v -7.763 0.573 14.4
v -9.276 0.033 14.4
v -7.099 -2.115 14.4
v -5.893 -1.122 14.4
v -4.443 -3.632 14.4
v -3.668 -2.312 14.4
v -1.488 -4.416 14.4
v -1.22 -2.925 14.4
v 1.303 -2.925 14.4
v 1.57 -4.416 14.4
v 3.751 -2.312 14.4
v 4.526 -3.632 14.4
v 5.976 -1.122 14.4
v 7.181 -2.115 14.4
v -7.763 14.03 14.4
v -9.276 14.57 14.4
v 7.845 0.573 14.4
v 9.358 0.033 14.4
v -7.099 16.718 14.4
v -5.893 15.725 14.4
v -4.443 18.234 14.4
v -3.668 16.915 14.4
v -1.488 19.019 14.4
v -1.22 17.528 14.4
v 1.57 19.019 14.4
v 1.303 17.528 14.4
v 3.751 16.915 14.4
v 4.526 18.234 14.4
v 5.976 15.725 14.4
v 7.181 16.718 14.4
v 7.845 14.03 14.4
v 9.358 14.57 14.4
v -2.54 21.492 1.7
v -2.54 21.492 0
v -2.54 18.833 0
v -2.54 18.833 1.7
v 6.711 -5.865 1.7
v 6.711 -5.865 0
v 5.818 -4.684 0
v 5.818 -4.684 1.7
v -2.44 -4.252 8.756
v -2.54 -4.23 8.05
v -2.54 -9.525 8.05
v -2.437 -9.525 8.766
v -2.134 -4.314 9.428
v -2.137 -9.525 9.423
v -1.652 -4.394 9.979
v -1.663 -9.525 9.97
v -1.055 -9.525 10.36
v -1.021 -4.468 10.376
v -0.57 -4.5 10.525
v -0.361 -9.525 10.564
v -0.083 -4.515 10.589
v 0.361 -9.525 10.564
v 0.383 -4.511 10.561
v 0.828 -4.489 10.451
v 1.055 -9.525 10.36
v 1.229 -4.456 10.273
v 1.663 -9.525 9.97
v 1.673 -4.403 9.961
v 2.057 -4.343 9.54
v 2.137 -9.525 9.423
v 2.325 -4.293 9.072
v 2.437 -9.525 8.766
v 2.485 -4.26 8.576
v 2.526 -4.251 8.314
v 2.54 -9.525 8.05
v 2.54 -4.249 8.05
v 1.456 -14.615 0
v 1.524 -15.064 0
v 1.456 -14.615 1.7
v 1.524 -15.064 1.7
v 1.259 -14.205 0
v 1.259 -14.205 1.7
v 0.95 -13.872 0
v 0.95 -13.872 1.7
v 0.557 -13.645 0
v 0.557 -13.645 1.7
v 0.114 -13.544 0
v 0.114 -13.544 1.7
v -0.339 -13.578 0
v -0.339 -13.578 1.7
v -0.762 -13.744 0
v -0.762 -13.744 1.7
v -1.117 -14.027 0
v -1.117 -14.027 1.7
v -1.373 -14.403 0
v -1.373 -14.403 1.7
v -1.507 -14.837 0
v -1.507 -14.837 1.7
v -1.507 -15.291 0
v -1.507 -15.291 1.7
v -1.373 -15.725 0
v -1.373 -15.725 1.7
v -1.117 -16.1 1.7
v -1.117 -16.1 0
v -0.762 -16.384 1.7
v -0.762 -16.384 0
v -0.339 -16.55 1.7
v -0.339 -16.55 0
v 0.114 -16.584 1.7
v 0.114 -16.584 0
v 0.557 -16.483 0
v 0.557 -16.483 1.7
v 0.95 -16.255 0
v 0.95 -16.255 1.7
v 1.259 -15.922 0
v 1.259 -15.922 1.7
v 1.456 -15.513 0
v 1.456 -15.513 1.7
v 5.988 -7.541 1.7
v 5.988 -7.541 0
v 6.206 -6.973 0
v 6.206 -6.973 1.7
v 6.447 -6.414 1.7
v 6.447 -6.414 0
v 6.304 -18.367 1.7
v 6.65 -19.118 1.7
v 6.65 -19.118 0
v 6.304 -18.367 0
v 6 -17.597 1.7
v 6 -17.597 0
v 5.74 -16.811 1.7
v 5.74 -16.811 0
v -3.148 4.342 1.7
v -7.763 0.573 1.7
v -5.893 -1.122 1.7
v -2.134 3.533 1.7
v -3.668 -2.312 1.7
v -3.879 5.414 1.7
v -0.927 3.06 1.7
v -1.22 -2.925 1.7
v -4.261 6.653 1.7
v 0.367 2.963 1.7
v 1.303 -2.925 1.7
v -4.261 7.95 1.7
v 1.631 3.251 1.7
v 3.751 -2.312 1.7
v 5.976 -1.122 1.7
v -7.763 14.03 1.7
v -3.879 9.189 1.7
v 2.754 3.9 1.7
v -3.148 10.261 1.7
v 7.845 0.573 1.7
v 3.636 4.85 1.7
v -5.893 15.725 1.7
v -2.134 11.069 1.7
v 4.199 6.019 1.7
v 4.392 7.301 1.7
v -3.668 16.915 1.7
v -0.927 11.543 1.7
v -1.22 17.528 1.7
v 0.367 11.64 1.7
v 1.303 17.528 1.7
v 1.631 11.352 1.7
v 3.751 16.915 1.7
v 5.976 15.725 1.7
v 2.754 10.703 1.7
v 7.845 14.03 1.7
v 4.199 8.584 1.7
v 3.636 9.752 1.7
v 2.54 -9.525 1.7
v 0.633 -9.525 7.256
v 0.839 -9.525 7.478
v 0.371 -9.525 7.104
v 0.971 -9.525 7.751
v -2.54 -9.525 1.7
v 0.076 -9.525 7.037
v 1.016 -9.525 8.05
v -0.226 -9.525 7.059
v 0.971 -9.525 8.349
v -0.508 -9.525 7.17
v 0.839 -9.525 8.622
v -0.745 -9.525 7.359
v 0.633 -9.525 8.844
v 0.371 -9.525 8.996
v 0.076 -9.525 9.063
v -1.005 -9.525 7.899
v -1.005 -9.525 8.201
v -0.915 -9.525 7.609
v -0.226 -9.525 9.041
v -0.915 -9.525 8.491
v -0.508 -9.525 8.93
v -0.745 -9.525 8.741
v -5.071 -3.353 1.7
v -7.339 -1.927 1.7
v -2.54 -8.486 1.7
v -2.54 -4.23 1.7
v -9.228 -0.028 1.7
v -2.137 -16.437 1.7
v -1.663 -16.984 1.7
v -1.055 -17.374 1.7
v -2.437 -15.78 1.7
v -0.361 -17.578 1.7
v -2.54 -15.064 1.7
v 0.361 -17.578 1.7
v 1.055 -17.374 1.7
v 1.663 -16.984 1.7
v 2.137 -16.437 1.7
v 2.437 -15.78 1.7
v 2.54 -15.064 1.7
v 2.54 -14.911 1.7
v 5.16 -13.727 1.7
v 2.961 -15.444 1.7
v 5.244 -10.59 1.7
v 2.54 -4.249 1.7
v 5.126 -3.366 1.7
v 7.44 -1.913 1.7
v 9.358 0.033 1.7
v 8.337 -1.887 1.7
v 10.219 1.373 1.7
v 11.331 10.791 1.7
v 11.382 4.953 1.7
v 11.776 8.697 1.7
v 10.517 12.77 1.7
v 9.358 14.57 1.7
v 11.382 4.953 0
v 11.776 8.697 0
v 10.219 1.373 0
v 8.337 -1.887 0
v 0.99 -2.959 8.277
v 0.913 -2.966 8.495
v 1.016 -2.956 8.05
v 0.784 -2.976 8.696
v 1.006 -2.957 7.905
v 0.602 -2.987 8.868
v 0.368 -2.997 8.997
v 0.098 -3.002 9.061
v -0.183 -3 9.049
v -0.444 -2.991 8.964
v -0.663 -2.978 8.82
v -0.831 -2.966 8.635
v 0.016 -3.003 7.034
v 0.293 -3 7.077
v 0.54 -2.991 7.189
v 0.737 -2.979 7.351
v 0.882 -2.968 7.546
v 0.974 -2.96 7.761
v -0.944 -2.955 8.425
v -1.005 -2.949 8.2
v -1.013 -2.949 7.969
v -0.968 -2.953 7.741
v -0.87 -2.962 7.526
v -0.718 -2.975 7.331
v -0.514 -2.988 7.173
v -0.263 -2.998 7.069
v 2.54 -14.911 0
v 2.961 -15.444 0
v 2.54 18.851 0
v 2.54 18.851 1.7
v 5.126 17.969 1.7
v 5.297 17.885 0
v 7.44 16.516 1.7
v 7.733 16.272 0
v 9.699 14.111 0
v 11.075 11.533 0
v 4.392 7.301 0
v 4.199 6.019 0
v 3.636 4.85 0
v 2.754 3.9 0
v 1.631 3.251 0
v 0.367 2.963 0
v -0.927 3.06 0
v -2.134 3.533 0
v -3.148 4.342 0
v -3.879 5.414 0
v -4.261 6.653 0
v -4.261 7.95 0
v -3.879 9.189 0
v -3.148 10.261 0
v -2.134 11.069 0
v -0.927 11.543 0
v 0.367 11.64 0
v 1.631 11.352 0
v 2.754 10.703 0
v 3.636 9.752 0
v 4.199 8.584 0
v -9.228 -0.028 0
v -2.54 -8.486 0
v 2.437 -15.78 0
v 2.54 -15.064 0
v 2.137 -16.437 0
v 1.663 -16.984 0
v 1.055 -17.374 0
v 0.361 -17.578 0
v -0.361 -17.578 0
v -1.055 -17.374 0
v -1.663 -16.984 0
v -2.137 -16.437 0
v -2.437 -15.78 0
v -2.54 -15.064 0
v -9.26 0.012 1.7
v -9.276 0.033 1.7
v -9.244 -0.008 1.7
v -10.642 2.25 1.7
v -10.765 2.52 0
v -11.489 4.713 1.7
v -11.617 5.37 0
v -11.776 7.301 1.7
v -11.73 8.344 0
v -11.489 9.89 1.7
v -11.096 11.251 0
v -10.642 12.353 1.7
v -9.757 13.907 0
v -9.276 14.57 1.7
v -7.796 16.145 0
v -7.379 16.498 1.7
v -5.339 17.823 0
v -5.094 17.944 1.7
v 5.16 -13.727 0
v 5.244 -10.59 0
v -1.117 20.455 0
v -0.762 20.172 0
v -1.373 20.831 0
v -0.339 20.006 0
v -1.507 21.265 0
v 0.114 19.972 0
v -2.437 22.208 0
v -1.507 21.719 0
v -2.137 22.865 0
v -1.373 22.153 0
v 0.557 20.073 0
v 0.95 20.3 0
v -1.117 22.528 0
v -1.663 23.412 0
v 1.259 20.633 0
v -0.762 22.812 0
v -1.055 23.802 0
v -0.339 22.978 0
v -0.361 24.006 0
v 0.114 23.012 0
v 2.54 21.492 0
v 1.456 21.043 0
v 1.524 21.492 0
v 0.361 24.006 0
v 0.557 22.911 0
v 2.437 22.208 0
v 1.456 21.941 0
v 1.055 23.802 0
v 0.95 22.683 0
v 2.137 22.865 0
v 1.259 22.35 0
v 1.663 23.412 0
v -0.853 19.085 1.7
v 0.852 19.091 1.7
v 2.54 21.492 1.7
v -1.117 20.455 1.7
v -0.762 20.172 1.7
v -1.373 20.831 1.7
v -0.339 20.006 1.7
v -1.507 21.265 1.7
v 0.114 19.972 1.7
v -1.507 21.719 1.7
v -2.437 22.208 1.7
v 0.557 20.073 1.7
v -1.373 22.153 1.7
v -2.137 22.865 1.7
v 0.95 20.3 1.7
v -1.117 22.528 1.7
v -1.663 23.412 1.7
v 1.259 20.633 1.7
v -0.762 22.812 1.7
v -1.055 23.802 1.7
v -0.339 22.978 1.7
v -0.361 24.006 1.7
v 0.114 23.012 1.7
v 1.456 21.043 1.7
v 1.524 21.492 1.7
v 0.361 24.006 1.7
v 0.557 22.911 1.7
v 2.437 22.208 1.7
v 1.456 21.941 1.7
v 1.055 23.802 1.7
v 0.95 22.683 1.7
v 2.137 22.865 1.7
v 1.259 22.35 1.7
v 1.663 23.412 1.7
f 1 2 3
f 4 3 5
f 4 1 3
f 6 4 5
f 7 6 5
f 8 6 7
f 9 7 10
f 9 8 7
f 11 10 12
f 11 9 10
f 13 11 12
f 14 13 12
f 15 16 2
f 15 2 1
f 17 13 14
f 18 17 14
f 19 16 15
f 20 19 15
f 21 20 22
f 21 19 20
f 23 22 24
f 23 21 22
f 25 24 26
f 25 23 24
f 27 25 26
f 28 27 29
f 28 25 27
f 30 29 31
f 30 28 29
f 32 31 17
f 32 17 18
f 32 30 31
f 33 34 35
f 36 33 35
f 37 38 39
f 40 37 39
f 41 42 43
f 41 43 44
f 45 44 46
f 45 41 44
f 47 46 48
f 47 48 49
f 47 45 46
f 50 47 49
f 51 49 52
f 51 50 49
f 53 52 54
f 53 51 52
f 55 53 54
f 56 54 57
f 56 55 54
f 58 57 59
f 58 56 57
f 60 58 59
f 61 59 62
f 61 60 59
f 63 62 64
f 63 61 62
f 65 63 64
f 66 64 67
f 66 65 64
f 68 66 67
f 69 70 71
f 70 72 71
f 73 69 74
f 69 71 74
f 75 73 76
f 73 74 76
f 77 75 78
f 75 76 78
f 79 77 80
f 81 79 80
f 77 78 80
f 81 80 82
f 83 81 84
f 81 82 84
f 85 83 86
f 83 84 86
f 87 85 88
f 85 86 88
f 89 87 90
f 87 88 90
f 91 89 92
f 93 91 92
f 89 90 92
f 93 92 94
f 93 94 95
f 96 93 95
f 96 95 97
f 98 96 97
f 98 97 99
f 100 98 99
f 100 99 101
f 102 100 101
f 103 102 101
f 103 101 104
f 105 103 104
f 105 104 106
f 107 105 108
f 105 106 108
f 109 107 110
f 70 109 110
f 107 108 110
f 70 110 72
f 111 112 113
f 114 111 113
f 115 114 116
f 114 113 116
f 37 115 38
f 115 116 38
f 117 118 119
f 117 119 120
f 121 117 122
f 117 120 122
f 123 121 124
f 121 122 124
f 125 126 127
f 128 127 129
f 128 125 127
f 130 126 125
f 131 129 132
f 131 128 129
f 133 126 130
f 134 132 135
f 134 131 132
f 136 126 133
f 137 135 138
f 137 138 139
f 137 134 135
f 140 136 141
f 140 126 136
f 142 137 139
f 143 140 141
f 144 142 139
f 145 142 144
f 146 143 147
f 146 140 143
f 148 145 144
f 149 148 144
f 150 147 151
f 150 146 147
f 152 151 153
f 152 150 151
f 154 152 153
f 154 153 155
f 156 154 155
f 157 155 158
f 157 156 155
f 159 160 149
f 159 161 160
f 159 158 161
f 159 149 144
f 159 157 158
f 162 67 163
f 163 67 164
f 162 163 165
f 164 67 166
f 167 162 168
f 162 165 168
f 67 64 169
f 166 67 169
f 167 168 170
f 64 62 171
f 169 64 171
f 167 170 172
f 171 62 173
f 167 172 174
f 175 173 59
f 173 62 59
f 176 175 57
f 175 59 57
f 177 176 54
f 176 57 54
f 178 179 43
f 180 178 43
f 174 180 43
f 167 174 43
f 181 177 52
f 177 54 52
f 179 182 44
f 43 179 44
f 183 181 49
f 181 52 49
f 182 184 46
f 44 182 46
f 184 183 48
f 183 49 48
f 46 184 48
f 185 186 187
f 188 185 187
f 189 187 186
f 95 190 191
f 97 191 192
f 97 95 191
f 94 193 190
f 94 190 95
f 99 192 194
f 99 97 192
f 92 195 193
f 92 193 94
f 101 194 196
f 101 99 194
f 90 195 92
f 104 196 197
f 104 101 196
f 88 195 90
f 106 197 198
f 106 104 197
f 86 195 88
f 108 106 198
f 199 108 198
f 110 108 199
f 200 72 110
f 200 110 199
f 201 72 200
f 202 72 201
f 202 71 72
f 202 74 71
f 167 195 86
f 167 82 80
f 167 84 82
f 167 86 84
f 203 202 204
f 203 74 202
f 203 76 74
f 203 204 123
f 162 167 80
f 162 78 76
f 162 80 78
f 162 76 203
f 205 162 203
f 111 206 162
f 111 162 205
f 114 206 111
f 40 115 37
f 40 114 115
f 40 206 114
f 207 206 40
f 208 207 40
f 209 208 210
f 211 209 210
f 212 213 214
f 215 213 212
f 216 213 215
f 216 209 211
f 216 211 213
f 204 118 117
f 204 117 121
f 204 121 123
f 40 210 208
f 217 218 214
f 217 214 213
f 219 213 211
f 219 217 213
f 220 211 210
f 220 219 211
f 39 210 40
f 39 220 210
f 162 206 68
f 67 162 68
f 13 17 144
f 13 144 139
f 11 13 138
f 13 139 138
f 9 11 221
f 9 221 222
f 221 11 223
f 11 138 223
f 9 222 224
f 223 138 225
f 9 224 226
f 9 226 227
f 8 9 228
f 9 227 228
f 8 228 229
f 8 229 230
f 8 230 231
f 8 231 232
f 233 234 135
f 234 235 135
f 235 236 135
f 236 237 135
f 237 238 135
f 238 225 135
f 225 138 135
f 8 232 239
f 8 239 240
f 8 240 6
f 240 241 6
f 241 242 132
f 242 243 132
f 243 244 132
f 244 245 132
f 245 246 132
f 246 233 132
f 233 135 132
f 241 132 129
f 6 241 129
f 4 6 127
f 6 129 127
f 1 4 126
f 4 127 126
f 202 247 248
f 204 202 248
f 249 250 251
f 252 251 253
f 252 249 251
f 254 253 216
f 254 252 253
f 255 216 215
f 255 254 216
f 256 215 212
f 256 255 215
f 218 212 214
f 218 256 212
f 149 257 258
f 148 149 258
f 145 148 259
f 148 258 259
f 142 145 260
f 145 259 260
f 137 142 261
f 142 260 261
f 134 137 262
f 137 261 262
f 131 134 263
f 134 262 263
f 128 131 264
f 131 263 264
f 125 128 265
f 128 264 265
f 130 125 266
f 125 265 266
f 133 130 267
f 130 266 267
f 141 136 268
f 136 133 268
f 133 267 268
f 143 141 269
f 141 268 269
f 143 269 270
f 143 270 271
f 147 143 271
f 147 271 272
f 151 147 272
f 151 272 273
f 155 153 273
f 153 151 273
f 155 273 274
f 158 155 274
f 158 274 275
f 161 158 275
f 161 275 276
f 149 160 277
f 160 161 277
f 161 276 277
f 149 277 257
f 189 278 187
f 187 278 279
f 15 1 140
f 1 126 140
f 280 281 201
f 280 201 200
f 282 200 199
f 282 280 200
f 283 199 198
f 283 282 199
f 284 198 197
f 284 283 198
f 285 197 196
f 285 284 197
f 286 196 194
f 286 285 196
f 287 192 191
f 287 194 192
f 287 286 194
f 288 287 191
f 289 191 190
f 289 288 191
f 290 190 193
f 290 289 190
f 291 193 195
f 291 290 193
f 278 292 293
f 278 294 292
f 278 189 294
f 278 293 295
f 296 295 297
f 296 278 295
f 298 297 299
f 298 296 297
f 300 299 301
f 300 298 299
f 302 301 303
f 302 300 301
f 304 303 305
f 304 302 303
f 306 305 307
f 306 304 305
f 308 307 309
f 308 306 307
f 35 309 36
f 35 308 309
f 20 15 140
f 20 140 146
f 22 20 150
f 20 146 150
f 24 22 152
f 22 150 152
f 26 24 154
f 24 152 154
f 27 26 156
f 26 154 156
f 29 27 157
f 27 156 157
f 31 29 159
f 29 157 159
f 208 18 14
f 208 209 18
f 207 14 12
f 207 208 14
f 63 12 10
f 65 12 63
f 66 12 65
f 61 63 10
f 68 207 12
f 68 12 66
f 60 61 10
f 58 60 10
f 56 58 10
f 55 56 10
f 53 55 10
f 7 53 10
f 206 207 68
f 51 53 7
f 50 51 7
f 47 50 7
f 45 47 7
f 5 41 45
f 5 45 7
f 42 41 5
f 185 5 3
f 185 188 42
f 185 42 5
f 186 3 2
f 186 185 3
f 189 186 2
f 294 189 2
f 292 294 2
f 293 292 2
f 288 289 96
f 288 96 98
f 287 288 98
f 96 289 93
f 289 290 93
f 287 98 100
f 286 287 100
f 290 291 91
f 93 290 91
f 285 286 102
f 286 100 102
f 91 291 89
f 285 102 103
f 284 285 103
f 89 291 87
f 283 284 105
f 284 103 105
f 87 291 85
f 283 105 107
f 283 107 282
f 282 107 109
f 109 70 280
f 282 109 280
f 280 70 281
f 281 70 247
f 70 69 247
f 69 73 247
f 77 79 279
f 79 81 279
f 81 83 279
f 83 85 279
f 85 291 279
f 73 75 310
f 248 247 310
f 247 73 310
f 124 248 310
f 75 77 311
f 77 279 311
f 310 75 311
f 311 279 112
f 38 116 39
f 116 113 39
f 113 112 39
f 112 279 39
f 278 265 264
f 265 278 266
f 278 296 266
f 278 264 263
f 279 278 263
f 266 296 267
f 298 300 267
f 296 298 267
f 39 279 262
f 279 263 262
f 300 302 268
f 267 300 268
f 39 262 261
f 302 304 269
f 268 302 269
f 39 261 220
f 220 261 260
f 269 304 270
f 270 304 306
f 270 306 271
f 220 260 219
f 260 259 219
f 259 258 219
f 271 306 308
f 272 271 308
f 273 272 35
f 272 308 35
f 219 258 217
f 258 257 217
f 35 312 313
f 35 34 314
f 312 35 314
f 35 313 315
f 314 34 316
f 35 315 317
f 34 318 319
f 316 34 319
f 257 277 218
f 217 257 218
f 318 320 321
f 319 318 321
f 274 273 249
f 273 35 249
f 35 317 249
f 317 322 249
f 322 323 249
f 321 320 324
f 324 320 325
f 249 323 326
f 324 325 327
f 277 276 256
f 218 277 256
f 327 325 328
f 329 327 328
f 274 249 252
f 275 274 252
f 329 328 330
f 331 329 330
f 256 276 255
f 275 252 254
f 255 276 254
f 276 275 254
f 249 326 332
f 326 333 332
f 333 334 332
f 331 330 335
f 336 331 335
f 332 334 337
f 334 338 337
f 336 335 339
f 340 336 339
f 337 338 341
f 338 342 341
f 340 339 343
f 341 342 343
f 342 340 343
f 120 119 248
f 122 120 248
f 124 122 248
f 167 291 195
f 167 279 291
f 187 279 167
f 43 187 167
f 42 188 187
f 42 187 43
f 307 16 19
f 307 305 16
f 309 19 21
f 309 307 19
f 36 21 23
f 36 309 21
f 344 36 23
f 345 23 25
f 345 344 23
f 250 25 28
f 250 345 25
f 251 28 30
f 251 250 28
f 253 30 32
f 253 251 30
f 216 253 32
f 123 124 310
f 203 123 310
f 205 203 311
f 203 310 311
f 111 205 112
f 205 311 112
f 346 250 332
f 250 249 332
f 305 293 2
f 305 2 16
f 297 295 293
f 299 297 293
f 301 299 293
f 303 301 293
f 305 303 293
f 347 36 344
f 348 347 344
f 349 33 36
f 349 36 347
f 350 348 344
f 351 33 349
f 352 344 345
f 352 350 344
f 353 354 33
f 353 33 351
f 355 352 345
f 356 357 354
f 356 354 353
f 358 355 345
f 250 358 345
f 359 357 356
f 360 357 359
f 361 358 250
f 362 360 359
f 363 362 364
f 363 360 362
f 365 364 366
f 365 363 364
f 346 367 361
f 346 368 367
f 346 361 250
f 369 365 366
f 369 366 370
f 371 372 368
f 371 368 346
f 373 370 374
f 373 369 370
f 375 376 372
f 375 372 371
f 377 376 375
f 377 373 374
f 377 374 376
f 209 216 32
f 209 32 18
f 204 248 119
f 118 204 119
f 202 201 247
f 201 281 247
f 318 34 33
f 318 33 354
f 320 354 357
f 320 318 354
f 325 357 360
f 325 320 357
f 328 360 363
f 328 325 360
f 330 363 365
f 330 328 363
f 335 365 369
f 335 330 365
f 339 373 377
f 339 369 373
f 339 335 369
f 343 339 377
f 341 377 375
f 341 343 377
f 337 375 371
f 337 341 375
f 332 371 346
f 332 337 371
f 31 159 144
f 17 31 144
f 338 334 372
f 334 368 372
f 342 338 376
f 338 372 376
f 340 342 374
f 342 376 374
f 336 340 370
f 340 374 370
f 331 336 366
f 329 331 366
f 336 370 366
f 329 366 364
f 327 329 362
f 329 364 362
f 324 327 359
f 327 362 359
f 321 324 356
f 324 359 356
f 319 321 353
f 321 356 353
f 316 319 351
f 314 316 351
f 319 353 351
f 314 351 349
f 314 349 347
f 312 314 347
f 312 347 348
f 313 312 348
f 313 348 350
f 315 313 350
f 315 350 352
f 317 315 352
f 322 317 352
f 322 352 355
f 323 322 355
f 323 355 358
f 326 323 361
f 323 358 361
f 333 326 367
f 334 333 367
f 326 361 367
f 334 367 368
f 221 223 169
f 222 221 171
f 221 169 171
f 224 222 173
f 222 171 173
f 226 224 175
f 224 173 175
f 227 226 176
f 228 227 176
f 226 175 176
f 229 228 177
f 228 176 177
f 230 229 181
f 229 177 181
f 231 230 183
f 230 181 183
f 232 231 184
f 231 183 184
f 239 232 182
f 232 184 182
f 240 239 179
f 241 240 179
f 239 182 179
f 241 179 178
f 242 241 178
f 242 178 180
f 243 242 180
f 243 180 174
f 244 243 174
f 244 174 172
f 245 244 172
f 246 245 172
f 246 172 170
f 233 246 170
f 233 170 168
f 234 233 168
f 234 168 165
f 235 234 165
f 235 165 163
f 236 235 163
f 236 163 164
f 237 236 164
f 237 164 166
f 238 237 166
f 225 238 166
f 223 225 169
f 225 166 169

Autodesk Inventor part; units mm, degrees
ref_plane "YZ Plane" through (0, 0, 0) normal (1, 0, 0) x (0, 1, 0)
ref_plane "XZ Plane" through (0, 0, 0) normal (0, 1, 0) x (-1, 0, 0)
sketch "Sketch1" plane through (0, 0, 0) normal (0, 0, 1) x (1, 0, 0)
  line L0 (5.7396, -16.8109) -> (-2.4232, -6.7282) projected
  line L1 (-2.4232, -6.7282) -> (-8.3008, 0.7051) projected
  arc A0 (10.2494, 10.2845) -> (-8.3008, 0.7051) centre (0.0414, 7.3014) ccw projected
  arc A1 (2.7914, -3.3149) -> (10.2494, 10.2845) centre (0.2126, 6.944) ccw projected
  line L2 (2.7914, -3.3149) -> (5.9881, -7.541) projected
  arc A2 (6.711, -5.8652) -> (5.9881, -7.541) centre (19.909, -12.5525) ccw projected
  line L3 (6.711, -5.8652) -> (5.8177, -4.6842) projected
  arc A3 (5.8177, -4.6842) -> (11.7757, 8.697) centre (-6.2296, 8.697) ccw projected
  arc A4 (11.7757, 8.697) -> (2.54, 18.8513) centre (0.0414, 7.3014) ccw projected
  line L4 (-9.2281, -0.0281) -> (-2.54, -8.4863) projected
  line L5 (2.9614, -15.4438) -> (6.6502, -19.1185) projected
  arc A5 (5.7396, -16.8109) -> (6.6502, -19.1185) centre (19.909, -12.5525) ccw projected
  arc A6 (6.711, -5.8652) -> (6.6502, -19.1185) centre (19.909, -12.5525) ccw
  circle A7 centre (0.0414, 7.3014) radius 4.3509
  circle A8 centre (0, 21.4919) radius 1.27 projected
  line L6 (2.54, 18.8513) -> (2.54, 21.4919) projected
  arc A9 (2.54, 21.4919) -> (-2.54, 21.4919) centre (0, 21.4919) ccw projected
  line L7 (-2.54, 21.4919) -> (-2.54, 18.8331) projected
  arc A10 (-2.54, 18.8331) -> (-9.2281, -0.0281) centre (0.0414, 7.3014) ccw projected
  circle A11 centre (0, -15.0639) radius 1.27 projected
  line L8 (-2.54, -8.4863) -> (-2.54, -15.0639) projected
  arc A12 (-2.54, -15.0639) -> (2.54, -15.0639) centre (0, -15.0639) ccw projected
  line L9 (2.54, -15.0639) -> (2.54, -14.9108) projected
  line L10 (2.54, -14.9108) -> (2.9614, -15.4438) projected
  point P0 (0, 0)
extrude "Extrusion1" add sketch "Sketch1" along normal blind 1.7 contours A5 L5 L10 L9 A12 L8 L4 A10 L7 A9 L6 A4 A3 L3 A2 L2 A1 A0 L1 L0 | L0 L1 A0 A1 L2 A6 | A8 | A11
sketch "Sketch2" plane through (0, 0, 1.7) normal (0, 0, 1) x (1, 0, 0)
  circle A0 centre (0, 21.4919) radius 1.524
  circle A1 centre (0, -15.0639) radius 1.524
  line L0 (2.54, 17.6957) -> (-2.54, 17.6957)
  line L1 (-2.54, 17.6957) -> (-2.54, 21.4919)
  line L2 (2.54, 17.6957) -> (2.54, 21.4919)
  arc A2 (2.54, 21.4919) -> (-2.54, 21.4919) centre (0, 21.4919) ccw
  arc A3 (-2.54, -15.0639) -> (2.54, -15.0639) centre (0, -15.0639) ccw
  line L3 (-2.54, -15.0639) -> (-2.54, -7.1979)
  line L4 (-2.54, -7.1979) -> (2.54, -12.2319)
  line L5 (2.54, -12.2319) -> (2.54, -15.0639)
  point P0 (0, 0)
  dimension "d2" = 3.048
  dimension "d3" = 3.048
  dimension "d4" = 2.54
  dimension "d5" = 2.54
ref_plane "Work Plane1" through (-11.7757, -19.1185, 0) normal (0, 0, 1) x (1, 0, 0)
sketch "Sketch3" plane through (0, 0, 1.7) normal (0, 0, 1) x (1, 0, 0)
  line L0 (-7.5086, 0.6681) -> (-7.5086, 13.9346) projected
  arc A0 (7.5914, 13.9346) -> (-7.5086, 13.9346) centre (0.0414, 7.3014) ccw projected
  arc A1 (-7.5086, 0.6681) -> (7.5914, 0.6681) centre (0.0414, 7.3014) ccw projected
  line L1 (7.5914, 13.9346) -> (7.5914, 0.6681) projected
  arc A2 (-7.7626, 0.5731) -> (7.8454, 0.5731) centre (0.0414, 7.3014) ccw
  line L2 (-7.7626, 0.5731) -> (-7.7626, 14.0297)
  arc A3 (7.8454, 14.0297) -> (-7.7626, 14.0297) centre (0.0414, 7.3014) ccw
  line L3 (7.8454, 14.0297) -> (7.8454, 0.5731)
  arc A4 (-9.2757, 0.0326) -> (9.3585, 0.0326) centre (0.0414, 7.3014) ccw
  line L4 (-9.2757, 0.0326) -> (-9.2757, 14.5702)
  arc A5 (9.3585, 14.5702) -> (-9.2757, 14.5702) centre (0.0414, 7.3014) ccw
  line L5 (9.3585, 14.5702) -> (9.3585, 0.0326)
  line L6 (-9.2281, -0.0281) -> (-2.54, -8.4863) projected
  line L7 (2.9614, -15.4438) -> (6.6502, -19.1185) projected
  arc A6 (6.711, -5.8652) -> (6.6502, -19.1185) centre (19.909, -12.5525) ccw projected
  line L8 (6.711, -5.8652) -> (5.8177, -4.6842) projected
  arc A7 (5.8177, -4.6842) -> (11.7757, 8.697) centre (-6.2296, 8.697) ccw projected
  arc A8 (11.7757, 8.697) -> (2.54, 18.8513) centre (0.0414, 7.3014) ccw projected
  circle A9 centre (0.0414, 7.3014) radius 4.3509 projected
  arc A10 (11.7757, 8.697) -> (2.54, 18.8513) centre (0.0414, 7.3014) ccw projected
  line L9 (2.54, 18.8513) -> (2.54, 21.4919) projected
  arc A11 (2.54, 21.4919) -> (-2.54, 21.4919) centre (0, 21.4919) ccw projected
  line L10 (-2.54, 21.4919) -> (-2.54, 18.8331) projected
  arc A12 (-2.54, 18.8331) -> (-9.2281, -0.0281) centre (0.0414, 7.3014) ccw projected
  line L11 (-2.54, -8.4863) -> (-2.54, -15.0639) projected
  arc A13 (-2.54, -15.0639) -> (2.54, -15.0639) centre (0, -15.0639) ccw projected
  line L12 (2.54, -15.0639) -> (2.54, -14.9108) projected
  line L13 (2.54, -14.9108) -> (2.9614, -15.4438) projected
  point P0 (0, 0)
  dimension "d8" = 0.254
extrude "Extrusion3" add sketch "Sketch3" along normal blind 12.7 contours L4 A5 L5 A4
extrude "Extrusion4" cut sketch "Sketch2" against normal blind 12.7 contours A0 | A1
sketch "Sketch4" plane through (0, 0, 0) normal (0, 1, 0) x (-1, 0, 0)
  line L0 (9.2757, 14.4) -> (-9.3585, 14.4) projected
  line L1 (9.2757, 1.7) -> (9.2757, 14.4) projected
  line L2 (-9.3585, 1.7) -> (-9.3585, 14.4) projected
  line L3 (2.54, 1.7) -> (-2.54, 1.7) projected
  line L4 (2.54, 1.7) -> (-2.54, 1.7) projected
  line L5 (2.54, 1.7) -> (2.54, 8.05)
  line L6 (-2.54, 1.7) -> (-2.54, 8.05)
  arc A0 (2.54, 8.05) -> (-2.54, 8.05) centre (0, 8.05) ccw
  point P0 (0, 0)
  point P1 (-9.3585, 8.05)
extrude "Extrusion5" add sketch "Sketch4" against normal blind 9.525
sketch "Sketch5" plane through (0, 0, 14.4) normal (0, 0, 1) x (1, 0, 0)
  line L0 (-7.7626, 0.5731) -> (-7.7626, 14.0297) projected
  arc A0 (7.8454, 14.0297) -> (-7.7626, 14.0297) centre (0.0414, 7.3014) ccw projected
  line L1 (7.8454, 14.0297) -> (7.8454, 0.5731) projected
  arc A1 (-7.7626, 0.5731) -> (7.8454, 0.5731) centre (0.0414, 7.3014) ccw projected
  line L2 (9.3585, 0.0326) -> (9.3585, 14.5702) projected
  arc A2 (9.3585, 14.5702) -> (-9.2757, 14.5702) centre (0.0414, 7.3014) ccw projected
  line L3 (-9.2757, 14.5702) -> (-9.2757, 0.0326) projected
  arc A3 (-9.2757, 0.0326) -> (9.3585, 0.0326) centre (0.0414, 7.3014) ccw projected
  point P0 (0, 0)
extrude "Extrusion6" cut sketch "Sketch5" against normal up to surface (12.7 mm away) contours L0 A0 L1 A1
sketch "Sketch6" plane through (0, -9.525, 0) normal (0, -1, 0) x (1, 0, 0)
  circle A0 centre (0, 8.05) radius 1.016
  arc A1 (2.54, 8.05) -> (-2.54, 8.05) centre (0, 8.05) ccw projected
  point P0 (0, 0)
  dimension "d17" = 2.032
extrude "Extrusion7" cut sketch "Sketch6" against normal blind 12.7
properties part number "Motor Holder"
